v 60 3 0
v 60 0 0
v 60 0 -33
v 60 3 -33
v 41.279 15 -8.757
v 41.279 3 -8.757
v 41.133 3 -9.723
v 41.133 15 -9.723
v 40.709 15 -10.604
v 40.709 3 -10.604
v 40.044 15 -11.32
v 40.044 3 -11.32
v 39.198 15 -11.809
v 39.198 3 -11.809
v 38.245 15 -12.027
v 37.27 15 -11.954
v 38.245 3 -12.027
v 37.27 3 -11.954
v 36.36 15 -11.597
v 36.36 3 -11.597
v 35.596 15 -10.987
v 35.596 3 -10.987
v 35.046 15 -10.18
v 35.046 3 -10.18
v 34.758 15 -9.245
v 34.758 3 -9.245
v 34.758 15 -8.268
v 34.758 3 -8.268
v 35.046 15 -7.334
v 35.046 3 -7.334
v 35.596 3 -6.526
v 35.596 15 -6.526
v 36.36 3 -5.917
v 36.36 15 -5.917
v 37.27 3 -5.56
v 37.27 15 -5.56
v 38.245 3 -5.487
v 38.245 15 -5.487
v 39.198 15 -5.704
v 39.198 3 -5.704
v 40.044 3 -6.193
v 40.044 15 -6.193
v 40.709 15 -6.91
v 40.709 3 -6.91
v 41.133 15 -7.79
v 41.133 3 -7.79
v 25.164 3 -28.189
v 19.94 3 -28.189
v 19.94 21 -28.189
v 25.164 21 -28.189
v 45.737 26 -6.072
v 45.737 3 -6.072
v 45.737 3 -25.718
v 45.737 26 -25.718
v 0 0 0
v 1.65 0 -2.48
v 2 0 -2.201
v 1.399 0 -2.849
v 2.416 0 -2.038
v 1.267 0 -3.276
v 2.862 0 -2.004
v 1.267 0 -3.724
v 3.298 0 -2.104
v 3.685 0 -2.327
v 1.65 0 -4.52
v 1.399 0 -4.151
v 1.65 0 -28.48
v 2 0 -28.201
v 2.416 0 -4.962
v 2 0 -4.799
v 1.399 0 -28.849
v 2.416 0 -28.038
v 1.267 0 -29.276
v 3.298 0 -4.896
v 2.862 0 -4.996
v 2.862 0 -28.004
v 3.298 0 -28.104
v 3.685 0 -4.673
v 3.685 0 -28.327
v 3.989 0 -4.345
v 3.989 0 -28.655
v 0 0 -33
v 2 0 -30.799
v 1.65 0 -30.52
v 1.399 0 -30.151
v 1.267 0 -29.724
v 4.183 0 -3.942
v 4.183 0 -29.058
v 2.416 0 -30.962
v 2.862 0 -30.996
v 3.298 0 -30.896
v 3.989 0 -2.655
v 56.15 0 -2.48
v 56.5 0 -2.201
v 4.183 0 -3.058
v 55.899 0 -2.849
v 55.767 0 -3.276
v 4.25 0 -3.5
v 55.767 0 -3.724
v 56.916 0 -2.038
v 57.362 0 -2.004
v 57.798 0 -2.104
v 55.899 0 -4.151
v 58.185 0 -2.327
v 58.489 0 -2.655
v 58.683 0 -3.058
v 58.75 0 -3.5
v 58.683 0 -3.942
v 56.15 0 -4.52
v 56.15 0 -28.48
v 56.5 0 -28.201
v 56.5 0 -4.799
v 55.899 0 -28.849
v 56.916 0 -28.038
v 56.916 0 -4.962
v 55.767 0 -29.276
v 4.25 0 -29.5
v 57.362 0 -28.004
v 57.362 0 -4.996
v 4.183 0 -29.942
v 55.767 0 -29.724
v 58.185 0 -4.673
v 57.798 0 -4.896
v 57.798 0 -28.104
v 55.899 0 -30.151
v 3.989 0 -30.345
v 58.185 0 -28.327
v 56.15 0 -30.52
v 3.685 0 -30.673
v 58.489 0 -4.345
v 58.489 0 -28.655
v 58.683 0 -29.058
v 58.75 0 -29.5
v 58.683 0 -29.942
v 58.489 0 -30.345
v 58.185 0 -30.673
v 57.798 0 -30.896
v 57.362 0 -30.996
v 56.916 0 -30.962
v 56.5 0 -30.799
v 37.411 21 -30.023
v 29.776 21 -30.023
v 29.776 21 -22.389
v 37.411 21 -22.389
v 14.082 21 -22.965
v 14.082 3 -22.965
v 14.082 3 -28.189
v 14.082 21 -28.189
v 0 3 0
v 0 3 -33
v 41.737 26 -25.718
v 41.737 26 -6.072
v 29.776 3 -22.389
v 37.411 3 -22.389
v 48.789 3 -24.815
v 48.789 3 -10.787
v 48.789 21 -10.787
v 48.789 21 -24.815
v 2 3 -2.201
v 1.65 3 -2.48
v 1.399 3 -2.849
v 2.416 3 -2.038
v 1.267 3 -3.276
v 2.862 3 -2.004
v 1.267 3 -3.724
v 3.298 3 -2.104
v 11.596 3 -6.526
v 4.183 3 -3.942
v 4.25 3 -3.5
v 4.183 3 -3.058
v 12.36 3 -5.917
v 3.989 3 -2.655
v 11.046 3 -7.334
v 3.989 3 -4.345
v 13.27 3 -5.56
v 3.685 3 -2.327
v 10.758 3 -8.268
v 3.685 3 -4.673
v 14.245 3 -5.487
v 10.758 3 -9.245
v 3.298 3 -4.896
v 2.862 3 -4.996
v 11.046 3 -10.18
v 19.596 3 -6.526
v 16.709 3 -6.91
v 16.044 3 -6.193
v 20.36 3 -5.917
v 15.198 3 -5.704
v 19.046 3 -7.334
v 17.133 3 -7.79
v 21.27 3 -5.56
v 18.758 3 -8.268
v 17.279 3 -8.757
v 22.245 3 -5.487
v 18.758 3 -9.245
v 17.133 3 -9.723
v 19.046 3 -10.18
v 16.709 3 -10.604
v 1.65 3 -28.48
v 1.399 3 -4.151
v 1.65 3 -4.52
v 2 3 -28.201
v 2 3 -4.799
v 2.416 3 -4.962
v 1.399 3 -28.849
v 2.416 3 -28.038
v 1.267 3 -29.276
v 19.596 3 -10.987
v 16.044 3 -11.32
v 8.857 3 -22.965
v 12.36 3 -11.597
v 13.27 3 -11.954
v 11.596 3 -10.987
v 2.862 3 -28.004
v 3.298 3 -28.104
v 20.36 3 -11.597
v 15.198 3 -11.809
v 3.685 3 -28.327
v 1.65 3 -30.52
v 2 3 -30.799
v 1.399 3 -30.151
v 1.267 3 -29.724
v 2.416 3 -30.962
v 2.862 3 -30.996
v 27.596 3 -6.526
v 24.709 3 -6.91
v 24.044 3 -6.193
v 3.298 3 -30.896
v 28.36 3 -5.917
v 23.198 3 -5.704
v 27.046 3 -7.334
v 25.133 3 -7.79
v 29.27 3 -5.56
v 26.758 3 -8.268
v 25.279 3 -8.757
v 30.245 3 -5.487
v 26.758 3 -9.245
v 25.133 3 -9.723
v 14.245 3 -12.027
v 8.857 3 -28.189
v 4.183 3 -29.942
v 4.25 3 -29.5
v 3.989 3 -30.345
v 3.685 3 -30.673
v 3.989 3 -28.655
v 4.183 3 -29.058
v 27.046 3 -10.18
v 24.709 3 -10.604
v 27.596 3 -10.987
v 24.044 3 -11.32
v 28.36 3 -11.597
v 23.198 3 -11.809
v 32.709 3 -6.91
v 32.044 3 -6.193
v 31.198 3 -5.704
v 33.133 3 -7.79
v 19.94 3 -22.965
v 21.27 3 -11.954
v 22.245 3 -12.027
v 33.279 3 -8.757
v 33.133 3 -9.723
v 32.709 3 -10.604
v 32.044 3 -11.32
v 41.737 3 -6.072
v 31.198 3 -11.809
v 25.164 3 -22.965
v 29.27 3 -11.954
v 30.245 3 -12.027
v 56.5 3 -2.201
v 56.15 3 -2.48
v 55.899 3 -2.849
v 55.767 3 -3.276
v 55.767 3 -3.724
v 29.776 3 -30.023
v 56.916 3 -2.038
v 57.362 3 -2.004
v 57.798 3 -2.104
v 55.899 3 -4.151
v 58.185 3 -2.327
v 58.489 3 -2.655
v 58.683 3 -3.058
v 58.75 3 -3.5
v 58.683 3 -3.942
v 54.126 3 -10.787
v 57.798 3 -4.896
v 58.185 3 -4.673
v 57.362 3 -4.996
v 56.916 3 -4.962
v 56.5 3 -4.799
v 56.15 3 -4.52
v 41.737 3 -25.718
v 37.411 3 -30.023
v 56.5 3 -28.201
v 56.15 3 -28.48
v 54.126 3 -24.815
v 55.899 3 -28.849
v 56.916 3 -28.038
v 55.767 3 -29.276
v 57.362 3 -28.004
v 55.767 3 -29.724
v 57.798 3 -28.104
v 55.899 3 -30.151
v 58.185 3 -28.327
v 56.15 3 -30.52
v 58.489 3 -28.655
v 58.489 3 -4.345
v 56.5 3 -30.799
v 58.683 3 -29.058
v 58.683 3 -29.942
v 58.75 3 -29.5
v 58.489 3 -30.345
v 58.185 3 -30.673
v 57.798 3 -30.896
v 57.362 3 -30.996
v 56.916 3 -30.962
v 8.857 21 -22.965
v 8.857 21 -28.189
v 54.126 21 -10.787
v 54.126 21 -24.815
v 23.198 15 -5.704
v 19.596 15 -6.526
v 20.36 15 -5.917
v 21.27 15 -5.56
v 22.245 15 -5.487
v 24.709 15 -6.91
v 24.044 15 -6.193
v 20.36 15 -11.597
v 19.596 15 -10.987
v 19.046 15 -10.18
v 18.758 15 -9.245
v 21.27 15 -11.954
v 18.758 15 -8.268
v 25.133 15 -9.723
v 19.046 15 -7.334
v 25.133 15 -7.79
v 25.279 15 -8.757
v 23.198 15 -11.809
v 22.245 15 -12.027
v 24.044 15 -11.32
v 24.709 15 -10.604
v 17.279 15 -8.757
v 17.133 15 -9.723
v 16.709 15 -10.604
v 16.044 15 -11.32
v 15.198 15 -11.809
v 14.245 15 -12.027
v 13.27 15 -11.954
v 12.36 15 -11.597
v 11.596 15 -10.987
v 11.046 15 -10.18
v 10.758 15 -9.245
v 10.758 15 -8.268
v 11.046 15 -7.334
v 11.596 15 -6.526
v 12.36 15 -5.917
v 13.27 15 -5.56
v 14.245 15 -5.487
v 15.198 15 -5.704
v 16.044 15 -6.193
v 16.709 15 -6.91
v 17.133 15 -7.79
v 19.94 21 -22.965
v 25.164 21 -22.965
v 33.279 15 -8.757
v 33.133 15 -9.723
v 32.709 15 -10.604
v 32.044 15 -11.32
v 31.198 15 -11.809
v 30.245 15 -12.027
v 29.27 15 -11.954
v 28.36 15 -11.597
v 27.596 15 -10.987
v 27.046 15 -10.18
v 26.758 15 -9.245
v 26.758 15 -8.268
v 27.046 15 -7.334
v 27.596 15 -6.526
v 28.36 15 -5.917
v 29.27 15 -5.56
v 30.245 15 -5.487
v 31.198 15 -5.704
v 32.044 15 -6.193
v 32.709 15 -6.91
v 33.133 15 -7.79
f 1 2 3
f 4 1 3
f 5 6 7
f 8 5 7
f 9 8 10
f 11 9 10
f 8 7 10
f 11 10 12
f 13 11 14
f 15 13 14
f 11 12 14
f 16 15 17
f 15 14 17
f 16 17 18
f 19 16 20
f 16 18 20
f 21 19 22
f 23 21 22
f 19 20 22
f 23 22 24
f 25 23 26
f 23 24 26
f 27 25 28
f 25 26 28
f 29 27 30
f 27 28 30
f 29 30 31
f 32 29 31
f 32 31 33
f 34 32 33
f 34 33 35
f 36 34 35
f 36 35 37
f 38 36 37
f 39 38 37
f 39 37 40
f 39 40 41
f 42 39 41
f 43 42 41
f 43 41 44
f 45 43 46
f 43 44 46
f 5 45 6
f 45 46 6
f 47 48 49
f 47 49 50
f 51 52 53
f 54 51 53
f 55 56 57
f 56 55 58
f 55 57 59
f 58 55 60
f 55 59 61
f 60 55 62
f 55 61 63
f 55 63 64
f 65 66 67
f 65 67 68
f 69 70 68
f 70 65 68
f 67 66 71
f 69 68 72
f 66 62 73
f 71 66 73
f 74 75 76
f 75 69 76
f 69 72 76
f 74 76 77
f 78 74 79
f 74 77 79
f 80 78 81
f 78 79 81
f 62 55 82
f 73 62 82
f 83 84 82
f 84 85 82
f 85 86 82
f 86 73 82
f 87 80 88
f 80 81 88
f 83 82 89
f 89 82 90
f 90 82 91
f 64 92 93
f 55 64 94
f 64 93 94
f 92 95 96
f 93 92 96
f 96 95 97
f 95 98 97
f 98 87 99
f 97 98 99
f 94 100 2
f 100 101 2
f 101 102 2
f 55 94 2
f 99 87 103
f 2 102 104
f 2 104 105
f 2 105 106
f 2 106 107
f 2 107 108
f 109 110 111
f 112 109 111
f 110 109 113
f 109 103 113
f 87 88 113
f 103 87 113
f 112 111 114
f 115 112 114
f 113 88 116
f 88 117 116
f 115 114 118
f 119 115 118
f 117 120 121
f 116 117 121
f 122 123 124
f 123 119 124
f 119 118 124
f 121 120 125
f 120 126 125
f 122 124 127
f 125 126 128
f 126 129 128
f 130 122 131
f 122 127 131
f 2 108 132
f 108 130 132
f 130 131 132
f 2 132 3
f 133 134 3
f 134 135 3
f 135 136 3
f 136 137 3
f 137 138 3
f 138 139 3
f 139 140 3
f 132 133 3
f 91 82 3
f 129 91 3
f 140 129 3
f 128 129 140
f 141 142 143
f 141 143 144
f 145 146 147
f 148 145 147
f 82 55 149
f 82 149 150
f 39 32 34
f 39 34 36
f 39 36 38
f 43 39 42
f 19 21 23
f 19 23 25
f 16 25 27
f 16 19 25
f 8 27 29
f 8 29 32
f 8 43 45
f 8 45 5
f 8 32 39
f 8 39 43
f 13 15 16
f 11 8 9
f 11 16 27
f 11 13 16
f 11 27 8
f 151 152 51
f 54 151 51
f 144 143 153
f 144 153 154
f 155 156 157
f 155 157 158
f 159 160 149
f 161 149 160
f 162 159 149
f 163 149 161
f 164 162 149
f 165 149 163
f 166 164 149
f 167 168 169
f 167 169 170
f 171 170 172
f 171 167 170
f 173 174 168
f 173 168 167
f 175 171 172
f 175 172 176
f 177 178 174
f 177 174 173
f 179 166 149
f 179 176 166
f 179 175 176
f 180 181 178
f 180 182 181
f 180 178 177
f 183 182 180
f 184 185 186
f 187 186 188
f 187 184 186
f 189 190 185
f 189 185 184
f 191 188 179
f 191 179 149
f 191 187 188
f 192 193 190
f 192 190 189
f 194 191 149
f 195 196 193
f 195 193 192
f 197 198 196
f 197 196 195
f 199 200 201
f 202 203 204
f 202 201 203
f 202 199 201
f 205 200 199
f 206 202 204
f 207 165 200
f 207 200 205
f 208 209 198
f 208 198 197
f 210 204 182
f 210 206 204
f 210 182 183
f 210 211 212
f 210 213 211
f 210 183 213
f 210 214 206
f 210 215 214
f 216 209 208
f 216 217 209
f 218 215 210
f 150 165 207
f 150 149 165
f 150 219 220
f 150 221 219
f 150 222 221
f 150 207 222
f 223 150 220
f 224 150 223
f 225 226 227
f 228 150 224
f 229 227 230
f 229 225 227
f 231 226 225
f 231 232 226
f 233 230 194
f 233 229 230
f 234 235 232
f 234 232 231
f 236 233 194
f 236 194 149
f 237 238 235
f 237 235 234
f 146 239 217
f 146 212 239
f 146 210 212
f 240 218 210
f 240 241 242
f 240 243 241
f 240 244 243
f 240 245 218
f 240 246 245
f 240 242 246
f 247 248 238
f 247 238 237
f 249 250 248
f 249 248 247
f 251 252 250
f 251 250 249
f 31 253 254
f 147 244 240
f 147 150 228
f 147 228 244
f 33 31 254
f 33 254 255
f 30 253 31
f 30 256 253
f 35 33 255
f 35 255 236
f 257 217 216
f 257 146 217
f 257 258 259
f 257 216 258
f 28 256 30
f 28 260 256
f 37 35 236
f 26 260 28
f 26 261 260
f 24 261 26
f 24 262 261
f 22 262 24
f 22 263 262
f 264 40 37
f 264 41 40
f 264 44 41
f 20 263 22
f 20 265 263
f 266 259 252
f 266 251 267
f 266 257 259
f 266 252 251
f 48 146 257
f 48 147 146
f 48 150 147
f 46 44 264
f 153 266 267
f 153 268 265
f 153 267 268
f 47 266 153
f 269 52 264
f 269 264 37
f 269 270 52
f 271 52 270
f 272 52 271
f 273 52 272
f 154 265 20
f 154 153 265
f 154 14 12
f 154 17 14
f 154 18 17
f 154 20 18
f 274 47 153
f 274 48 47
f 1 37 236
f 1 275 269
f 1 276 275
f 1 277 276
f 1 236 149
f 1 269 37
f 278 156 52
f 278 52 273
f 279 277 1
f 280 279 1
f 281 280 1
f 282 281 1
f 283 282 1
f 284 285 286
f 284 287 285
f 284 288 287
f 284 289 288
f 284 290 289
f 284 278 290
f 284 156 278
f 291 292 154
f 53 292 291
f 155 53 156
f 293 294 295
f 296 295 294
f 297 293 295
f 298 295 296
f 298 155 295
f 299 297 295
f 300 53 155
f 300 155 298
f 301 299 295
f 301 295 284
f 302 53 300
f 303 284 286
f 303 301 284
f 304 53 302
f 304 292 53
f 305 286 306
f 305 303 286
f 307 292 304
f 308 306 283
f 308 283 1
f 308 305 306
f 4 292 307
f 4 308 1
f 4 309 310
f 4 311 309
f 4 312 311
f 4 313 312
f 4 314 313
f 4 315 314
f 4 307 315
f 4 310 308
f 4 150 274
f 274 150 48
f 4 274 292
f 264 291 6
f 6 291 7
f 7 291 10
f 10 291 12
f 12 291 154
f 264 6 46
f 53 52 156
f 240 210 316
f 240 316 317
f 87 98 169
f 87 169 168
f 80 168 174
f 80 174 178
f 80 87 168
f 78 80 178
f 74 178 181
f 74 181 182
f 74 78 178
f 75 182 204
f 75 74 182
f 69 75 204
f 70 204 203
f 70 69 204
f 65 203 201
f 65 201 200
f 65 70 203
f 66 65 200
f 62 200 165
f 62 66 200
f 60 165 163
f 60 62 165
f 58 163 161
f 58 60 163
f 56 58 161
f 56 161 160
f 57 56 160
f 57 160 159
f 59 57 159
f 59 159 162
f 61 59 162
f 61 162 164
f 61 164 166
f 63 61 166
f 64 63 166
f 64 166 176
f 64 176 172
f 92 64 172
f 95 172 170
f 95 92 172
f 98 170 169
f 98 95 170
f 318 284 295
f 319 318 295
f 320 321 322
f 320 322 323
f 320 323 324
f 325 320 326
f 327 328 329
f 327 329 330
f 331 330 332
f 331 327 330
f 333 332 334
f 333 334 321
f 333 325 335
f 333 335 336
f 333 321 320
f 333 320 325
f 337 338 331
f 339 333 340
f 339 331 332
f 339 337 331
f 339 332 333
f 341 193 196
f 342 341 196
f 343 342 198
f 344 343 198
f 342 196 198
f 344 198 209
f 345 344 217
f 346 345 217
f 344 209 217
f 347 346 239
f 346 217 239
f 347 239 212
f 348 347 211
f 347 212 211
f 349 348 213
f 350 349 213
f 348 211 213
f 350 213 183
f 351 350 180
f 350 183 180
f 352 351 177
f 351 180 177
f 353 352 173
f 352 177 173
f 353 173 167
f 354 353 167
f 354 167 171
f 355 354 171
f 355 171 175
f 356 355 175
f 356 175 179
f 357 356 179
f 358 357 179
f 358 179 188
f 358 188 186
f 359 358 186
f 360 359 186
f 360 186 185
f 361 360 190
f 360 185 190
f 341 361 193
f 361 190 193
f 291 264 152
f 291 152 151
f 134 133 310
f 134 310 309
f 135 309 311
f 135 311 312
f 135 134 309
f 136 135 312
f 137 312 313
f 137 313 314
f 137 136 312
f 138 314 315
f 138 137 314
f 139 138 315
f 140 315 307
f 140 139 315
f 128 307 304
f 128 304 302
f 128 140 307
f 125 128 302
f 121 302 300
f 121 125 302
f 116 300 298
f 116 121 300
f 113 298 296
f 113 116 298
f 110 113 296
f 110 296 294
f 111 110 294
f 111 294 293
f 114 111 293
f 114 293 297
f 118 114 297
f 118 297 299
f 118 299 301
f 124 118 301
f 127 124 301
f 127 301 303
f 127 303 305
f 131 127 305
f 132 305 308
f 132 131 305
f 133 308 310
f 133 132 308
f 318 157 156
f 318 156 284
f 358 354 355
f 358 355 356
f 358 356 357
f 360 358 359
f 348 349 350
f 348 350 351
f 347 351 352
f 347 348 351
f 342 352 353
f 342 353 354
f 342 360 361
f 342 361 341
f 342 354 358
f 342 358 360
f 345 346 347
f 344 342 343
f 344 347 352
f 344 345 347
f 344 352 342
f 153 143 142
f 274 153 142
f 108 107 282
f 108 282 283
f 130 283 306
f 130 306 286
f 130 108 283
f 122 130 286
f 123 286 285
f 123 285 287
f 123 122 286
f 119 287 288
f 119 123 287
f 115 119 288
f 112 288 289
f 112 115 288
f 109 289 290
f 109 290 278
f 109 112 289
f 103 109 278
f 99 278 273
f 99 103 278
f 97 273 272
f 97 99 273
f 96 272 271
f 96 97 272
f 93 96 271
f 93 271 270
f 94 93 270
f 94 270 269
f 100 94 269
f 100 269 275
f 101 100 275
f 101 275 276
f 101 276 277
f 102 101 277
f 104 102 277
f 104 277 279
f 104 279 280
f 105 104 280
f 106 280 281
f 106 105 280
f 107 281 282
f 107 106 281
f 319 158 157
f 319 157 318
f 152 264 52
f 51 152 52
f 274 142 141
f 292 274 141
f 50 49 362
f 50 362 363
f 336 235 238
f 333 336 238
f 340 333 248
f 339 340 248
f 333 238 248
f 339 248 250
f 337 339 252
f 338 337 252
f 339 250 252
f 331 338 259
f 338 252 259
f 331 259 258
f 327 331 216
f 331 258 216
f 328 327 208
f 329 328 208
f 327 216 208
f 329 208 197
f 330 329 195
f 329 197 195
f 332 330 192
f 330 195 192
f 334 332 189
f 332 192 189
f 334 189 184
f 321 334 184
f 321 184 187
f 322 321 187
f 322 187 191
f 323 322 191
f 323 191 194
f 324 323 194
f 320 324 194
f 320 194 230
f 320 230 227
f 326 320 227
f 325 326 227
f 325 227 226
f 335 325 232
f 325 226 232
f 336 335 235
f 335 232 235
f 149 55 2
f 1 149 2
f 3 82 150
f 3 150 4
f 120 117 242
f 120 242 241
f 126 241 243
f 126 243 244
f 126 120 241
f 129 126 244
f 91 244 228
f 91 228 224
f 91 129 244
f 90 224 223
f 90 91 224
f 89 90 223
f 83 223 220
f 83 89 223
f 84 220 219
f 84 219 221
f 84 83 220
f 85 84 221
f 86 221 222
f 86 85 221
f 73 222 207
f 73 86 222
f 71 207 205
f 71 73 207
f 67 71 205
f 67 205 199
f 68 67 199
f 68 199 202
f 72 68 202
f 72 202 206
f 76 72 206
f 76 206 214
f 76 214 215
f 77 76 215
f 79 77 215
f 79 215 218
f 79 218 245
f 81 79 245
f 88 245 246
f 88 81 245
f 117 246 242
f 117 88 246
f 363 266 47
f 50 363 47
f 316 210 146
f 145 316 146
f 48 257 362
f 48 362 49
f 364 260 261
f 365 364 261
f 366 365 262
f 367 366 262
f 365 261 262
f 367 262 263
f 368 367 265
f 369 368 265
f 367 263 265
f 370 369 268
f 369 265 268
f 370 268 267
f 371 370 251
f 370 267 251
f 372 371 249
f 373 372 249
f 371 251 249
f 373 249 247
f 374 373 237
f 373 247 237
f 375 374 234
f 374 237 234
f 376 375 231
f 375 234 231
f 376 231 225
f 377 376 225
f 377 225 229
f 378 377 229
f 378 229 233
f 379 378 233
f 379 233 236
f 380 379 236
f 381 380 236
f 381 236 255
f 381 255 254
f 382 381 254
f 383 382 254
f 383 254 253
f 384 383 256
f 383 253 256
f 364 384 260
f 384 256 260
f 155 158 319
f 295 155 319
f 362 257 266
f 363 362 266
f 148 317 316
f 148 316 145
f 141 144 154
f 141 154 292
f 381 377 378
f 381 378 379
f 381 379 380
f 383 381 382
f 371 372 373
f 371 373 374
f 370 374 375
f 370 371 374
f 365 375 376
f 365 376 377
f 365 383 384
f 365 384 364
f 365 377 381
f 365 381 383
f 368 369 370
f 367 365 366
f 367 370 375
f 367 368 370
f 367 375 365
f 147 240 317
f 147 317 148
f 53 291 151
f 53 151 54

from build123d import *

# Parameters (mm, degrees)
ESQUISSE1_W      = 60
ESQUISSE1_H      = 33
ESQUISSE1_R      = 1.5
EXTRUSION1_DEPTH = 3
ESQUISSE2_W      = 7.634201779
ESQUISSE2_H      = 7.63420178
ESQUISSE2_W_2    = 5.337752956
ESQUISSE2_H_2    = 14.027301674
ESQUISSE2_W_3    = 5.224355128
ESQUISSE2_H_3    = 5.224355128
EXTRUSION2_DEPTH = 18
ESQUISSE3_R      = 3.279080348
EXTRUSION3_DEPTH = 12
ESQUISSE4_W      = 4
ESQUISSE4_H      = 19.646099489
EXTRUSION4_DEPTH = 23


with BuildPart() as part:
    # Esquisse1 → Extrusion1 (new body)
    with BuildSketch(Plane(origin=(0, 0, 0), x_dir=(1, 0, 0), z_dir=(0, 1, 0))):
        with Locations((30, 16.5)):
            Rectangle(ESQUISSE1_W, ESQUISSE1_H)
        with Locations((2.75, 29.5)):
            Circle(ESQUISSE1_R, mode=Mode.SUBTRACT)
        with Locations((57.25, 29.5)):
            Circle(ESQUISSE1_R, mode=Mode.SUBTRACT)
        with Locations((57.25, 3.5)):
            Circle(ESQUISSE1_R, mode=Mode.SUBTRACT)
        with Locations((2.75, 3.5)):
            Circle(ESQUISSE1_R, mode=Mode.SUBTRACT)
    extrude(amount=EXTRUSION1_DEPTH)

    # Esquisse2 → Extrusion2 (add)
    with BuildSketch(Plane(origin=(0, 3, 0), x_dir=(1, 0, 0), z_dir=(0, 1, 0))):
        with Locations((33.593446124, 26.205676479)):
            Rectangle(ESQUISSE2_W, ESQUISSE2_H)
        with Locations((51.457386868, 17.801055276)):
            Rectangle(ESQUISSE2_W_2, ESQUISSE2_H_2)
        with Locations((11.46939236, 25.577155504)):
            Rectangle(ESQUISSE2_W_3, ESQUISSE2_H_3)
        with Locations((22.552159567, 25.577155504)):
            Rectangle(ESQUISSE2_W_3, ESQUISSE2_H_3)
    extrude(amount=EXTRUSION2_DEPTH)

    # Esquisse3 → Extrusion3 (add)
    with BuildSketch(Plane(origin=(0, 3, 0), x_dir=(1, 0, 0), z_dir=(0, 1, 0))):
        with Locations((14, 8.756763264)):
            Circle(ESQUISSE3_R)
        with Locations((22, 8.756763264)):
            Circle(ESQUISSE3_R)
        with Locations((30, 8.756763264)):
            Circle(ESQUISSE3_R)
        with Locations((38, 8.756763264)):
            Circle(ESQUISSE3_R)
    extrude(amount=EXTRUSION3_DEPTH)

    # Esquisse4 → Extrusion4 (add)
    with BuildSketch(Plane(origin=(0, 3, 0), x_dir=(1, 0, 0), z_dir=(0, 1, 0))):
        with Locations((43.737455539, 15.895279312)):
            Rectangle(ESQUISSE4_W, ESQUISSE4_H)
    extrude(amount=EXTRUSION4_DEPTH)


solid = part.part
